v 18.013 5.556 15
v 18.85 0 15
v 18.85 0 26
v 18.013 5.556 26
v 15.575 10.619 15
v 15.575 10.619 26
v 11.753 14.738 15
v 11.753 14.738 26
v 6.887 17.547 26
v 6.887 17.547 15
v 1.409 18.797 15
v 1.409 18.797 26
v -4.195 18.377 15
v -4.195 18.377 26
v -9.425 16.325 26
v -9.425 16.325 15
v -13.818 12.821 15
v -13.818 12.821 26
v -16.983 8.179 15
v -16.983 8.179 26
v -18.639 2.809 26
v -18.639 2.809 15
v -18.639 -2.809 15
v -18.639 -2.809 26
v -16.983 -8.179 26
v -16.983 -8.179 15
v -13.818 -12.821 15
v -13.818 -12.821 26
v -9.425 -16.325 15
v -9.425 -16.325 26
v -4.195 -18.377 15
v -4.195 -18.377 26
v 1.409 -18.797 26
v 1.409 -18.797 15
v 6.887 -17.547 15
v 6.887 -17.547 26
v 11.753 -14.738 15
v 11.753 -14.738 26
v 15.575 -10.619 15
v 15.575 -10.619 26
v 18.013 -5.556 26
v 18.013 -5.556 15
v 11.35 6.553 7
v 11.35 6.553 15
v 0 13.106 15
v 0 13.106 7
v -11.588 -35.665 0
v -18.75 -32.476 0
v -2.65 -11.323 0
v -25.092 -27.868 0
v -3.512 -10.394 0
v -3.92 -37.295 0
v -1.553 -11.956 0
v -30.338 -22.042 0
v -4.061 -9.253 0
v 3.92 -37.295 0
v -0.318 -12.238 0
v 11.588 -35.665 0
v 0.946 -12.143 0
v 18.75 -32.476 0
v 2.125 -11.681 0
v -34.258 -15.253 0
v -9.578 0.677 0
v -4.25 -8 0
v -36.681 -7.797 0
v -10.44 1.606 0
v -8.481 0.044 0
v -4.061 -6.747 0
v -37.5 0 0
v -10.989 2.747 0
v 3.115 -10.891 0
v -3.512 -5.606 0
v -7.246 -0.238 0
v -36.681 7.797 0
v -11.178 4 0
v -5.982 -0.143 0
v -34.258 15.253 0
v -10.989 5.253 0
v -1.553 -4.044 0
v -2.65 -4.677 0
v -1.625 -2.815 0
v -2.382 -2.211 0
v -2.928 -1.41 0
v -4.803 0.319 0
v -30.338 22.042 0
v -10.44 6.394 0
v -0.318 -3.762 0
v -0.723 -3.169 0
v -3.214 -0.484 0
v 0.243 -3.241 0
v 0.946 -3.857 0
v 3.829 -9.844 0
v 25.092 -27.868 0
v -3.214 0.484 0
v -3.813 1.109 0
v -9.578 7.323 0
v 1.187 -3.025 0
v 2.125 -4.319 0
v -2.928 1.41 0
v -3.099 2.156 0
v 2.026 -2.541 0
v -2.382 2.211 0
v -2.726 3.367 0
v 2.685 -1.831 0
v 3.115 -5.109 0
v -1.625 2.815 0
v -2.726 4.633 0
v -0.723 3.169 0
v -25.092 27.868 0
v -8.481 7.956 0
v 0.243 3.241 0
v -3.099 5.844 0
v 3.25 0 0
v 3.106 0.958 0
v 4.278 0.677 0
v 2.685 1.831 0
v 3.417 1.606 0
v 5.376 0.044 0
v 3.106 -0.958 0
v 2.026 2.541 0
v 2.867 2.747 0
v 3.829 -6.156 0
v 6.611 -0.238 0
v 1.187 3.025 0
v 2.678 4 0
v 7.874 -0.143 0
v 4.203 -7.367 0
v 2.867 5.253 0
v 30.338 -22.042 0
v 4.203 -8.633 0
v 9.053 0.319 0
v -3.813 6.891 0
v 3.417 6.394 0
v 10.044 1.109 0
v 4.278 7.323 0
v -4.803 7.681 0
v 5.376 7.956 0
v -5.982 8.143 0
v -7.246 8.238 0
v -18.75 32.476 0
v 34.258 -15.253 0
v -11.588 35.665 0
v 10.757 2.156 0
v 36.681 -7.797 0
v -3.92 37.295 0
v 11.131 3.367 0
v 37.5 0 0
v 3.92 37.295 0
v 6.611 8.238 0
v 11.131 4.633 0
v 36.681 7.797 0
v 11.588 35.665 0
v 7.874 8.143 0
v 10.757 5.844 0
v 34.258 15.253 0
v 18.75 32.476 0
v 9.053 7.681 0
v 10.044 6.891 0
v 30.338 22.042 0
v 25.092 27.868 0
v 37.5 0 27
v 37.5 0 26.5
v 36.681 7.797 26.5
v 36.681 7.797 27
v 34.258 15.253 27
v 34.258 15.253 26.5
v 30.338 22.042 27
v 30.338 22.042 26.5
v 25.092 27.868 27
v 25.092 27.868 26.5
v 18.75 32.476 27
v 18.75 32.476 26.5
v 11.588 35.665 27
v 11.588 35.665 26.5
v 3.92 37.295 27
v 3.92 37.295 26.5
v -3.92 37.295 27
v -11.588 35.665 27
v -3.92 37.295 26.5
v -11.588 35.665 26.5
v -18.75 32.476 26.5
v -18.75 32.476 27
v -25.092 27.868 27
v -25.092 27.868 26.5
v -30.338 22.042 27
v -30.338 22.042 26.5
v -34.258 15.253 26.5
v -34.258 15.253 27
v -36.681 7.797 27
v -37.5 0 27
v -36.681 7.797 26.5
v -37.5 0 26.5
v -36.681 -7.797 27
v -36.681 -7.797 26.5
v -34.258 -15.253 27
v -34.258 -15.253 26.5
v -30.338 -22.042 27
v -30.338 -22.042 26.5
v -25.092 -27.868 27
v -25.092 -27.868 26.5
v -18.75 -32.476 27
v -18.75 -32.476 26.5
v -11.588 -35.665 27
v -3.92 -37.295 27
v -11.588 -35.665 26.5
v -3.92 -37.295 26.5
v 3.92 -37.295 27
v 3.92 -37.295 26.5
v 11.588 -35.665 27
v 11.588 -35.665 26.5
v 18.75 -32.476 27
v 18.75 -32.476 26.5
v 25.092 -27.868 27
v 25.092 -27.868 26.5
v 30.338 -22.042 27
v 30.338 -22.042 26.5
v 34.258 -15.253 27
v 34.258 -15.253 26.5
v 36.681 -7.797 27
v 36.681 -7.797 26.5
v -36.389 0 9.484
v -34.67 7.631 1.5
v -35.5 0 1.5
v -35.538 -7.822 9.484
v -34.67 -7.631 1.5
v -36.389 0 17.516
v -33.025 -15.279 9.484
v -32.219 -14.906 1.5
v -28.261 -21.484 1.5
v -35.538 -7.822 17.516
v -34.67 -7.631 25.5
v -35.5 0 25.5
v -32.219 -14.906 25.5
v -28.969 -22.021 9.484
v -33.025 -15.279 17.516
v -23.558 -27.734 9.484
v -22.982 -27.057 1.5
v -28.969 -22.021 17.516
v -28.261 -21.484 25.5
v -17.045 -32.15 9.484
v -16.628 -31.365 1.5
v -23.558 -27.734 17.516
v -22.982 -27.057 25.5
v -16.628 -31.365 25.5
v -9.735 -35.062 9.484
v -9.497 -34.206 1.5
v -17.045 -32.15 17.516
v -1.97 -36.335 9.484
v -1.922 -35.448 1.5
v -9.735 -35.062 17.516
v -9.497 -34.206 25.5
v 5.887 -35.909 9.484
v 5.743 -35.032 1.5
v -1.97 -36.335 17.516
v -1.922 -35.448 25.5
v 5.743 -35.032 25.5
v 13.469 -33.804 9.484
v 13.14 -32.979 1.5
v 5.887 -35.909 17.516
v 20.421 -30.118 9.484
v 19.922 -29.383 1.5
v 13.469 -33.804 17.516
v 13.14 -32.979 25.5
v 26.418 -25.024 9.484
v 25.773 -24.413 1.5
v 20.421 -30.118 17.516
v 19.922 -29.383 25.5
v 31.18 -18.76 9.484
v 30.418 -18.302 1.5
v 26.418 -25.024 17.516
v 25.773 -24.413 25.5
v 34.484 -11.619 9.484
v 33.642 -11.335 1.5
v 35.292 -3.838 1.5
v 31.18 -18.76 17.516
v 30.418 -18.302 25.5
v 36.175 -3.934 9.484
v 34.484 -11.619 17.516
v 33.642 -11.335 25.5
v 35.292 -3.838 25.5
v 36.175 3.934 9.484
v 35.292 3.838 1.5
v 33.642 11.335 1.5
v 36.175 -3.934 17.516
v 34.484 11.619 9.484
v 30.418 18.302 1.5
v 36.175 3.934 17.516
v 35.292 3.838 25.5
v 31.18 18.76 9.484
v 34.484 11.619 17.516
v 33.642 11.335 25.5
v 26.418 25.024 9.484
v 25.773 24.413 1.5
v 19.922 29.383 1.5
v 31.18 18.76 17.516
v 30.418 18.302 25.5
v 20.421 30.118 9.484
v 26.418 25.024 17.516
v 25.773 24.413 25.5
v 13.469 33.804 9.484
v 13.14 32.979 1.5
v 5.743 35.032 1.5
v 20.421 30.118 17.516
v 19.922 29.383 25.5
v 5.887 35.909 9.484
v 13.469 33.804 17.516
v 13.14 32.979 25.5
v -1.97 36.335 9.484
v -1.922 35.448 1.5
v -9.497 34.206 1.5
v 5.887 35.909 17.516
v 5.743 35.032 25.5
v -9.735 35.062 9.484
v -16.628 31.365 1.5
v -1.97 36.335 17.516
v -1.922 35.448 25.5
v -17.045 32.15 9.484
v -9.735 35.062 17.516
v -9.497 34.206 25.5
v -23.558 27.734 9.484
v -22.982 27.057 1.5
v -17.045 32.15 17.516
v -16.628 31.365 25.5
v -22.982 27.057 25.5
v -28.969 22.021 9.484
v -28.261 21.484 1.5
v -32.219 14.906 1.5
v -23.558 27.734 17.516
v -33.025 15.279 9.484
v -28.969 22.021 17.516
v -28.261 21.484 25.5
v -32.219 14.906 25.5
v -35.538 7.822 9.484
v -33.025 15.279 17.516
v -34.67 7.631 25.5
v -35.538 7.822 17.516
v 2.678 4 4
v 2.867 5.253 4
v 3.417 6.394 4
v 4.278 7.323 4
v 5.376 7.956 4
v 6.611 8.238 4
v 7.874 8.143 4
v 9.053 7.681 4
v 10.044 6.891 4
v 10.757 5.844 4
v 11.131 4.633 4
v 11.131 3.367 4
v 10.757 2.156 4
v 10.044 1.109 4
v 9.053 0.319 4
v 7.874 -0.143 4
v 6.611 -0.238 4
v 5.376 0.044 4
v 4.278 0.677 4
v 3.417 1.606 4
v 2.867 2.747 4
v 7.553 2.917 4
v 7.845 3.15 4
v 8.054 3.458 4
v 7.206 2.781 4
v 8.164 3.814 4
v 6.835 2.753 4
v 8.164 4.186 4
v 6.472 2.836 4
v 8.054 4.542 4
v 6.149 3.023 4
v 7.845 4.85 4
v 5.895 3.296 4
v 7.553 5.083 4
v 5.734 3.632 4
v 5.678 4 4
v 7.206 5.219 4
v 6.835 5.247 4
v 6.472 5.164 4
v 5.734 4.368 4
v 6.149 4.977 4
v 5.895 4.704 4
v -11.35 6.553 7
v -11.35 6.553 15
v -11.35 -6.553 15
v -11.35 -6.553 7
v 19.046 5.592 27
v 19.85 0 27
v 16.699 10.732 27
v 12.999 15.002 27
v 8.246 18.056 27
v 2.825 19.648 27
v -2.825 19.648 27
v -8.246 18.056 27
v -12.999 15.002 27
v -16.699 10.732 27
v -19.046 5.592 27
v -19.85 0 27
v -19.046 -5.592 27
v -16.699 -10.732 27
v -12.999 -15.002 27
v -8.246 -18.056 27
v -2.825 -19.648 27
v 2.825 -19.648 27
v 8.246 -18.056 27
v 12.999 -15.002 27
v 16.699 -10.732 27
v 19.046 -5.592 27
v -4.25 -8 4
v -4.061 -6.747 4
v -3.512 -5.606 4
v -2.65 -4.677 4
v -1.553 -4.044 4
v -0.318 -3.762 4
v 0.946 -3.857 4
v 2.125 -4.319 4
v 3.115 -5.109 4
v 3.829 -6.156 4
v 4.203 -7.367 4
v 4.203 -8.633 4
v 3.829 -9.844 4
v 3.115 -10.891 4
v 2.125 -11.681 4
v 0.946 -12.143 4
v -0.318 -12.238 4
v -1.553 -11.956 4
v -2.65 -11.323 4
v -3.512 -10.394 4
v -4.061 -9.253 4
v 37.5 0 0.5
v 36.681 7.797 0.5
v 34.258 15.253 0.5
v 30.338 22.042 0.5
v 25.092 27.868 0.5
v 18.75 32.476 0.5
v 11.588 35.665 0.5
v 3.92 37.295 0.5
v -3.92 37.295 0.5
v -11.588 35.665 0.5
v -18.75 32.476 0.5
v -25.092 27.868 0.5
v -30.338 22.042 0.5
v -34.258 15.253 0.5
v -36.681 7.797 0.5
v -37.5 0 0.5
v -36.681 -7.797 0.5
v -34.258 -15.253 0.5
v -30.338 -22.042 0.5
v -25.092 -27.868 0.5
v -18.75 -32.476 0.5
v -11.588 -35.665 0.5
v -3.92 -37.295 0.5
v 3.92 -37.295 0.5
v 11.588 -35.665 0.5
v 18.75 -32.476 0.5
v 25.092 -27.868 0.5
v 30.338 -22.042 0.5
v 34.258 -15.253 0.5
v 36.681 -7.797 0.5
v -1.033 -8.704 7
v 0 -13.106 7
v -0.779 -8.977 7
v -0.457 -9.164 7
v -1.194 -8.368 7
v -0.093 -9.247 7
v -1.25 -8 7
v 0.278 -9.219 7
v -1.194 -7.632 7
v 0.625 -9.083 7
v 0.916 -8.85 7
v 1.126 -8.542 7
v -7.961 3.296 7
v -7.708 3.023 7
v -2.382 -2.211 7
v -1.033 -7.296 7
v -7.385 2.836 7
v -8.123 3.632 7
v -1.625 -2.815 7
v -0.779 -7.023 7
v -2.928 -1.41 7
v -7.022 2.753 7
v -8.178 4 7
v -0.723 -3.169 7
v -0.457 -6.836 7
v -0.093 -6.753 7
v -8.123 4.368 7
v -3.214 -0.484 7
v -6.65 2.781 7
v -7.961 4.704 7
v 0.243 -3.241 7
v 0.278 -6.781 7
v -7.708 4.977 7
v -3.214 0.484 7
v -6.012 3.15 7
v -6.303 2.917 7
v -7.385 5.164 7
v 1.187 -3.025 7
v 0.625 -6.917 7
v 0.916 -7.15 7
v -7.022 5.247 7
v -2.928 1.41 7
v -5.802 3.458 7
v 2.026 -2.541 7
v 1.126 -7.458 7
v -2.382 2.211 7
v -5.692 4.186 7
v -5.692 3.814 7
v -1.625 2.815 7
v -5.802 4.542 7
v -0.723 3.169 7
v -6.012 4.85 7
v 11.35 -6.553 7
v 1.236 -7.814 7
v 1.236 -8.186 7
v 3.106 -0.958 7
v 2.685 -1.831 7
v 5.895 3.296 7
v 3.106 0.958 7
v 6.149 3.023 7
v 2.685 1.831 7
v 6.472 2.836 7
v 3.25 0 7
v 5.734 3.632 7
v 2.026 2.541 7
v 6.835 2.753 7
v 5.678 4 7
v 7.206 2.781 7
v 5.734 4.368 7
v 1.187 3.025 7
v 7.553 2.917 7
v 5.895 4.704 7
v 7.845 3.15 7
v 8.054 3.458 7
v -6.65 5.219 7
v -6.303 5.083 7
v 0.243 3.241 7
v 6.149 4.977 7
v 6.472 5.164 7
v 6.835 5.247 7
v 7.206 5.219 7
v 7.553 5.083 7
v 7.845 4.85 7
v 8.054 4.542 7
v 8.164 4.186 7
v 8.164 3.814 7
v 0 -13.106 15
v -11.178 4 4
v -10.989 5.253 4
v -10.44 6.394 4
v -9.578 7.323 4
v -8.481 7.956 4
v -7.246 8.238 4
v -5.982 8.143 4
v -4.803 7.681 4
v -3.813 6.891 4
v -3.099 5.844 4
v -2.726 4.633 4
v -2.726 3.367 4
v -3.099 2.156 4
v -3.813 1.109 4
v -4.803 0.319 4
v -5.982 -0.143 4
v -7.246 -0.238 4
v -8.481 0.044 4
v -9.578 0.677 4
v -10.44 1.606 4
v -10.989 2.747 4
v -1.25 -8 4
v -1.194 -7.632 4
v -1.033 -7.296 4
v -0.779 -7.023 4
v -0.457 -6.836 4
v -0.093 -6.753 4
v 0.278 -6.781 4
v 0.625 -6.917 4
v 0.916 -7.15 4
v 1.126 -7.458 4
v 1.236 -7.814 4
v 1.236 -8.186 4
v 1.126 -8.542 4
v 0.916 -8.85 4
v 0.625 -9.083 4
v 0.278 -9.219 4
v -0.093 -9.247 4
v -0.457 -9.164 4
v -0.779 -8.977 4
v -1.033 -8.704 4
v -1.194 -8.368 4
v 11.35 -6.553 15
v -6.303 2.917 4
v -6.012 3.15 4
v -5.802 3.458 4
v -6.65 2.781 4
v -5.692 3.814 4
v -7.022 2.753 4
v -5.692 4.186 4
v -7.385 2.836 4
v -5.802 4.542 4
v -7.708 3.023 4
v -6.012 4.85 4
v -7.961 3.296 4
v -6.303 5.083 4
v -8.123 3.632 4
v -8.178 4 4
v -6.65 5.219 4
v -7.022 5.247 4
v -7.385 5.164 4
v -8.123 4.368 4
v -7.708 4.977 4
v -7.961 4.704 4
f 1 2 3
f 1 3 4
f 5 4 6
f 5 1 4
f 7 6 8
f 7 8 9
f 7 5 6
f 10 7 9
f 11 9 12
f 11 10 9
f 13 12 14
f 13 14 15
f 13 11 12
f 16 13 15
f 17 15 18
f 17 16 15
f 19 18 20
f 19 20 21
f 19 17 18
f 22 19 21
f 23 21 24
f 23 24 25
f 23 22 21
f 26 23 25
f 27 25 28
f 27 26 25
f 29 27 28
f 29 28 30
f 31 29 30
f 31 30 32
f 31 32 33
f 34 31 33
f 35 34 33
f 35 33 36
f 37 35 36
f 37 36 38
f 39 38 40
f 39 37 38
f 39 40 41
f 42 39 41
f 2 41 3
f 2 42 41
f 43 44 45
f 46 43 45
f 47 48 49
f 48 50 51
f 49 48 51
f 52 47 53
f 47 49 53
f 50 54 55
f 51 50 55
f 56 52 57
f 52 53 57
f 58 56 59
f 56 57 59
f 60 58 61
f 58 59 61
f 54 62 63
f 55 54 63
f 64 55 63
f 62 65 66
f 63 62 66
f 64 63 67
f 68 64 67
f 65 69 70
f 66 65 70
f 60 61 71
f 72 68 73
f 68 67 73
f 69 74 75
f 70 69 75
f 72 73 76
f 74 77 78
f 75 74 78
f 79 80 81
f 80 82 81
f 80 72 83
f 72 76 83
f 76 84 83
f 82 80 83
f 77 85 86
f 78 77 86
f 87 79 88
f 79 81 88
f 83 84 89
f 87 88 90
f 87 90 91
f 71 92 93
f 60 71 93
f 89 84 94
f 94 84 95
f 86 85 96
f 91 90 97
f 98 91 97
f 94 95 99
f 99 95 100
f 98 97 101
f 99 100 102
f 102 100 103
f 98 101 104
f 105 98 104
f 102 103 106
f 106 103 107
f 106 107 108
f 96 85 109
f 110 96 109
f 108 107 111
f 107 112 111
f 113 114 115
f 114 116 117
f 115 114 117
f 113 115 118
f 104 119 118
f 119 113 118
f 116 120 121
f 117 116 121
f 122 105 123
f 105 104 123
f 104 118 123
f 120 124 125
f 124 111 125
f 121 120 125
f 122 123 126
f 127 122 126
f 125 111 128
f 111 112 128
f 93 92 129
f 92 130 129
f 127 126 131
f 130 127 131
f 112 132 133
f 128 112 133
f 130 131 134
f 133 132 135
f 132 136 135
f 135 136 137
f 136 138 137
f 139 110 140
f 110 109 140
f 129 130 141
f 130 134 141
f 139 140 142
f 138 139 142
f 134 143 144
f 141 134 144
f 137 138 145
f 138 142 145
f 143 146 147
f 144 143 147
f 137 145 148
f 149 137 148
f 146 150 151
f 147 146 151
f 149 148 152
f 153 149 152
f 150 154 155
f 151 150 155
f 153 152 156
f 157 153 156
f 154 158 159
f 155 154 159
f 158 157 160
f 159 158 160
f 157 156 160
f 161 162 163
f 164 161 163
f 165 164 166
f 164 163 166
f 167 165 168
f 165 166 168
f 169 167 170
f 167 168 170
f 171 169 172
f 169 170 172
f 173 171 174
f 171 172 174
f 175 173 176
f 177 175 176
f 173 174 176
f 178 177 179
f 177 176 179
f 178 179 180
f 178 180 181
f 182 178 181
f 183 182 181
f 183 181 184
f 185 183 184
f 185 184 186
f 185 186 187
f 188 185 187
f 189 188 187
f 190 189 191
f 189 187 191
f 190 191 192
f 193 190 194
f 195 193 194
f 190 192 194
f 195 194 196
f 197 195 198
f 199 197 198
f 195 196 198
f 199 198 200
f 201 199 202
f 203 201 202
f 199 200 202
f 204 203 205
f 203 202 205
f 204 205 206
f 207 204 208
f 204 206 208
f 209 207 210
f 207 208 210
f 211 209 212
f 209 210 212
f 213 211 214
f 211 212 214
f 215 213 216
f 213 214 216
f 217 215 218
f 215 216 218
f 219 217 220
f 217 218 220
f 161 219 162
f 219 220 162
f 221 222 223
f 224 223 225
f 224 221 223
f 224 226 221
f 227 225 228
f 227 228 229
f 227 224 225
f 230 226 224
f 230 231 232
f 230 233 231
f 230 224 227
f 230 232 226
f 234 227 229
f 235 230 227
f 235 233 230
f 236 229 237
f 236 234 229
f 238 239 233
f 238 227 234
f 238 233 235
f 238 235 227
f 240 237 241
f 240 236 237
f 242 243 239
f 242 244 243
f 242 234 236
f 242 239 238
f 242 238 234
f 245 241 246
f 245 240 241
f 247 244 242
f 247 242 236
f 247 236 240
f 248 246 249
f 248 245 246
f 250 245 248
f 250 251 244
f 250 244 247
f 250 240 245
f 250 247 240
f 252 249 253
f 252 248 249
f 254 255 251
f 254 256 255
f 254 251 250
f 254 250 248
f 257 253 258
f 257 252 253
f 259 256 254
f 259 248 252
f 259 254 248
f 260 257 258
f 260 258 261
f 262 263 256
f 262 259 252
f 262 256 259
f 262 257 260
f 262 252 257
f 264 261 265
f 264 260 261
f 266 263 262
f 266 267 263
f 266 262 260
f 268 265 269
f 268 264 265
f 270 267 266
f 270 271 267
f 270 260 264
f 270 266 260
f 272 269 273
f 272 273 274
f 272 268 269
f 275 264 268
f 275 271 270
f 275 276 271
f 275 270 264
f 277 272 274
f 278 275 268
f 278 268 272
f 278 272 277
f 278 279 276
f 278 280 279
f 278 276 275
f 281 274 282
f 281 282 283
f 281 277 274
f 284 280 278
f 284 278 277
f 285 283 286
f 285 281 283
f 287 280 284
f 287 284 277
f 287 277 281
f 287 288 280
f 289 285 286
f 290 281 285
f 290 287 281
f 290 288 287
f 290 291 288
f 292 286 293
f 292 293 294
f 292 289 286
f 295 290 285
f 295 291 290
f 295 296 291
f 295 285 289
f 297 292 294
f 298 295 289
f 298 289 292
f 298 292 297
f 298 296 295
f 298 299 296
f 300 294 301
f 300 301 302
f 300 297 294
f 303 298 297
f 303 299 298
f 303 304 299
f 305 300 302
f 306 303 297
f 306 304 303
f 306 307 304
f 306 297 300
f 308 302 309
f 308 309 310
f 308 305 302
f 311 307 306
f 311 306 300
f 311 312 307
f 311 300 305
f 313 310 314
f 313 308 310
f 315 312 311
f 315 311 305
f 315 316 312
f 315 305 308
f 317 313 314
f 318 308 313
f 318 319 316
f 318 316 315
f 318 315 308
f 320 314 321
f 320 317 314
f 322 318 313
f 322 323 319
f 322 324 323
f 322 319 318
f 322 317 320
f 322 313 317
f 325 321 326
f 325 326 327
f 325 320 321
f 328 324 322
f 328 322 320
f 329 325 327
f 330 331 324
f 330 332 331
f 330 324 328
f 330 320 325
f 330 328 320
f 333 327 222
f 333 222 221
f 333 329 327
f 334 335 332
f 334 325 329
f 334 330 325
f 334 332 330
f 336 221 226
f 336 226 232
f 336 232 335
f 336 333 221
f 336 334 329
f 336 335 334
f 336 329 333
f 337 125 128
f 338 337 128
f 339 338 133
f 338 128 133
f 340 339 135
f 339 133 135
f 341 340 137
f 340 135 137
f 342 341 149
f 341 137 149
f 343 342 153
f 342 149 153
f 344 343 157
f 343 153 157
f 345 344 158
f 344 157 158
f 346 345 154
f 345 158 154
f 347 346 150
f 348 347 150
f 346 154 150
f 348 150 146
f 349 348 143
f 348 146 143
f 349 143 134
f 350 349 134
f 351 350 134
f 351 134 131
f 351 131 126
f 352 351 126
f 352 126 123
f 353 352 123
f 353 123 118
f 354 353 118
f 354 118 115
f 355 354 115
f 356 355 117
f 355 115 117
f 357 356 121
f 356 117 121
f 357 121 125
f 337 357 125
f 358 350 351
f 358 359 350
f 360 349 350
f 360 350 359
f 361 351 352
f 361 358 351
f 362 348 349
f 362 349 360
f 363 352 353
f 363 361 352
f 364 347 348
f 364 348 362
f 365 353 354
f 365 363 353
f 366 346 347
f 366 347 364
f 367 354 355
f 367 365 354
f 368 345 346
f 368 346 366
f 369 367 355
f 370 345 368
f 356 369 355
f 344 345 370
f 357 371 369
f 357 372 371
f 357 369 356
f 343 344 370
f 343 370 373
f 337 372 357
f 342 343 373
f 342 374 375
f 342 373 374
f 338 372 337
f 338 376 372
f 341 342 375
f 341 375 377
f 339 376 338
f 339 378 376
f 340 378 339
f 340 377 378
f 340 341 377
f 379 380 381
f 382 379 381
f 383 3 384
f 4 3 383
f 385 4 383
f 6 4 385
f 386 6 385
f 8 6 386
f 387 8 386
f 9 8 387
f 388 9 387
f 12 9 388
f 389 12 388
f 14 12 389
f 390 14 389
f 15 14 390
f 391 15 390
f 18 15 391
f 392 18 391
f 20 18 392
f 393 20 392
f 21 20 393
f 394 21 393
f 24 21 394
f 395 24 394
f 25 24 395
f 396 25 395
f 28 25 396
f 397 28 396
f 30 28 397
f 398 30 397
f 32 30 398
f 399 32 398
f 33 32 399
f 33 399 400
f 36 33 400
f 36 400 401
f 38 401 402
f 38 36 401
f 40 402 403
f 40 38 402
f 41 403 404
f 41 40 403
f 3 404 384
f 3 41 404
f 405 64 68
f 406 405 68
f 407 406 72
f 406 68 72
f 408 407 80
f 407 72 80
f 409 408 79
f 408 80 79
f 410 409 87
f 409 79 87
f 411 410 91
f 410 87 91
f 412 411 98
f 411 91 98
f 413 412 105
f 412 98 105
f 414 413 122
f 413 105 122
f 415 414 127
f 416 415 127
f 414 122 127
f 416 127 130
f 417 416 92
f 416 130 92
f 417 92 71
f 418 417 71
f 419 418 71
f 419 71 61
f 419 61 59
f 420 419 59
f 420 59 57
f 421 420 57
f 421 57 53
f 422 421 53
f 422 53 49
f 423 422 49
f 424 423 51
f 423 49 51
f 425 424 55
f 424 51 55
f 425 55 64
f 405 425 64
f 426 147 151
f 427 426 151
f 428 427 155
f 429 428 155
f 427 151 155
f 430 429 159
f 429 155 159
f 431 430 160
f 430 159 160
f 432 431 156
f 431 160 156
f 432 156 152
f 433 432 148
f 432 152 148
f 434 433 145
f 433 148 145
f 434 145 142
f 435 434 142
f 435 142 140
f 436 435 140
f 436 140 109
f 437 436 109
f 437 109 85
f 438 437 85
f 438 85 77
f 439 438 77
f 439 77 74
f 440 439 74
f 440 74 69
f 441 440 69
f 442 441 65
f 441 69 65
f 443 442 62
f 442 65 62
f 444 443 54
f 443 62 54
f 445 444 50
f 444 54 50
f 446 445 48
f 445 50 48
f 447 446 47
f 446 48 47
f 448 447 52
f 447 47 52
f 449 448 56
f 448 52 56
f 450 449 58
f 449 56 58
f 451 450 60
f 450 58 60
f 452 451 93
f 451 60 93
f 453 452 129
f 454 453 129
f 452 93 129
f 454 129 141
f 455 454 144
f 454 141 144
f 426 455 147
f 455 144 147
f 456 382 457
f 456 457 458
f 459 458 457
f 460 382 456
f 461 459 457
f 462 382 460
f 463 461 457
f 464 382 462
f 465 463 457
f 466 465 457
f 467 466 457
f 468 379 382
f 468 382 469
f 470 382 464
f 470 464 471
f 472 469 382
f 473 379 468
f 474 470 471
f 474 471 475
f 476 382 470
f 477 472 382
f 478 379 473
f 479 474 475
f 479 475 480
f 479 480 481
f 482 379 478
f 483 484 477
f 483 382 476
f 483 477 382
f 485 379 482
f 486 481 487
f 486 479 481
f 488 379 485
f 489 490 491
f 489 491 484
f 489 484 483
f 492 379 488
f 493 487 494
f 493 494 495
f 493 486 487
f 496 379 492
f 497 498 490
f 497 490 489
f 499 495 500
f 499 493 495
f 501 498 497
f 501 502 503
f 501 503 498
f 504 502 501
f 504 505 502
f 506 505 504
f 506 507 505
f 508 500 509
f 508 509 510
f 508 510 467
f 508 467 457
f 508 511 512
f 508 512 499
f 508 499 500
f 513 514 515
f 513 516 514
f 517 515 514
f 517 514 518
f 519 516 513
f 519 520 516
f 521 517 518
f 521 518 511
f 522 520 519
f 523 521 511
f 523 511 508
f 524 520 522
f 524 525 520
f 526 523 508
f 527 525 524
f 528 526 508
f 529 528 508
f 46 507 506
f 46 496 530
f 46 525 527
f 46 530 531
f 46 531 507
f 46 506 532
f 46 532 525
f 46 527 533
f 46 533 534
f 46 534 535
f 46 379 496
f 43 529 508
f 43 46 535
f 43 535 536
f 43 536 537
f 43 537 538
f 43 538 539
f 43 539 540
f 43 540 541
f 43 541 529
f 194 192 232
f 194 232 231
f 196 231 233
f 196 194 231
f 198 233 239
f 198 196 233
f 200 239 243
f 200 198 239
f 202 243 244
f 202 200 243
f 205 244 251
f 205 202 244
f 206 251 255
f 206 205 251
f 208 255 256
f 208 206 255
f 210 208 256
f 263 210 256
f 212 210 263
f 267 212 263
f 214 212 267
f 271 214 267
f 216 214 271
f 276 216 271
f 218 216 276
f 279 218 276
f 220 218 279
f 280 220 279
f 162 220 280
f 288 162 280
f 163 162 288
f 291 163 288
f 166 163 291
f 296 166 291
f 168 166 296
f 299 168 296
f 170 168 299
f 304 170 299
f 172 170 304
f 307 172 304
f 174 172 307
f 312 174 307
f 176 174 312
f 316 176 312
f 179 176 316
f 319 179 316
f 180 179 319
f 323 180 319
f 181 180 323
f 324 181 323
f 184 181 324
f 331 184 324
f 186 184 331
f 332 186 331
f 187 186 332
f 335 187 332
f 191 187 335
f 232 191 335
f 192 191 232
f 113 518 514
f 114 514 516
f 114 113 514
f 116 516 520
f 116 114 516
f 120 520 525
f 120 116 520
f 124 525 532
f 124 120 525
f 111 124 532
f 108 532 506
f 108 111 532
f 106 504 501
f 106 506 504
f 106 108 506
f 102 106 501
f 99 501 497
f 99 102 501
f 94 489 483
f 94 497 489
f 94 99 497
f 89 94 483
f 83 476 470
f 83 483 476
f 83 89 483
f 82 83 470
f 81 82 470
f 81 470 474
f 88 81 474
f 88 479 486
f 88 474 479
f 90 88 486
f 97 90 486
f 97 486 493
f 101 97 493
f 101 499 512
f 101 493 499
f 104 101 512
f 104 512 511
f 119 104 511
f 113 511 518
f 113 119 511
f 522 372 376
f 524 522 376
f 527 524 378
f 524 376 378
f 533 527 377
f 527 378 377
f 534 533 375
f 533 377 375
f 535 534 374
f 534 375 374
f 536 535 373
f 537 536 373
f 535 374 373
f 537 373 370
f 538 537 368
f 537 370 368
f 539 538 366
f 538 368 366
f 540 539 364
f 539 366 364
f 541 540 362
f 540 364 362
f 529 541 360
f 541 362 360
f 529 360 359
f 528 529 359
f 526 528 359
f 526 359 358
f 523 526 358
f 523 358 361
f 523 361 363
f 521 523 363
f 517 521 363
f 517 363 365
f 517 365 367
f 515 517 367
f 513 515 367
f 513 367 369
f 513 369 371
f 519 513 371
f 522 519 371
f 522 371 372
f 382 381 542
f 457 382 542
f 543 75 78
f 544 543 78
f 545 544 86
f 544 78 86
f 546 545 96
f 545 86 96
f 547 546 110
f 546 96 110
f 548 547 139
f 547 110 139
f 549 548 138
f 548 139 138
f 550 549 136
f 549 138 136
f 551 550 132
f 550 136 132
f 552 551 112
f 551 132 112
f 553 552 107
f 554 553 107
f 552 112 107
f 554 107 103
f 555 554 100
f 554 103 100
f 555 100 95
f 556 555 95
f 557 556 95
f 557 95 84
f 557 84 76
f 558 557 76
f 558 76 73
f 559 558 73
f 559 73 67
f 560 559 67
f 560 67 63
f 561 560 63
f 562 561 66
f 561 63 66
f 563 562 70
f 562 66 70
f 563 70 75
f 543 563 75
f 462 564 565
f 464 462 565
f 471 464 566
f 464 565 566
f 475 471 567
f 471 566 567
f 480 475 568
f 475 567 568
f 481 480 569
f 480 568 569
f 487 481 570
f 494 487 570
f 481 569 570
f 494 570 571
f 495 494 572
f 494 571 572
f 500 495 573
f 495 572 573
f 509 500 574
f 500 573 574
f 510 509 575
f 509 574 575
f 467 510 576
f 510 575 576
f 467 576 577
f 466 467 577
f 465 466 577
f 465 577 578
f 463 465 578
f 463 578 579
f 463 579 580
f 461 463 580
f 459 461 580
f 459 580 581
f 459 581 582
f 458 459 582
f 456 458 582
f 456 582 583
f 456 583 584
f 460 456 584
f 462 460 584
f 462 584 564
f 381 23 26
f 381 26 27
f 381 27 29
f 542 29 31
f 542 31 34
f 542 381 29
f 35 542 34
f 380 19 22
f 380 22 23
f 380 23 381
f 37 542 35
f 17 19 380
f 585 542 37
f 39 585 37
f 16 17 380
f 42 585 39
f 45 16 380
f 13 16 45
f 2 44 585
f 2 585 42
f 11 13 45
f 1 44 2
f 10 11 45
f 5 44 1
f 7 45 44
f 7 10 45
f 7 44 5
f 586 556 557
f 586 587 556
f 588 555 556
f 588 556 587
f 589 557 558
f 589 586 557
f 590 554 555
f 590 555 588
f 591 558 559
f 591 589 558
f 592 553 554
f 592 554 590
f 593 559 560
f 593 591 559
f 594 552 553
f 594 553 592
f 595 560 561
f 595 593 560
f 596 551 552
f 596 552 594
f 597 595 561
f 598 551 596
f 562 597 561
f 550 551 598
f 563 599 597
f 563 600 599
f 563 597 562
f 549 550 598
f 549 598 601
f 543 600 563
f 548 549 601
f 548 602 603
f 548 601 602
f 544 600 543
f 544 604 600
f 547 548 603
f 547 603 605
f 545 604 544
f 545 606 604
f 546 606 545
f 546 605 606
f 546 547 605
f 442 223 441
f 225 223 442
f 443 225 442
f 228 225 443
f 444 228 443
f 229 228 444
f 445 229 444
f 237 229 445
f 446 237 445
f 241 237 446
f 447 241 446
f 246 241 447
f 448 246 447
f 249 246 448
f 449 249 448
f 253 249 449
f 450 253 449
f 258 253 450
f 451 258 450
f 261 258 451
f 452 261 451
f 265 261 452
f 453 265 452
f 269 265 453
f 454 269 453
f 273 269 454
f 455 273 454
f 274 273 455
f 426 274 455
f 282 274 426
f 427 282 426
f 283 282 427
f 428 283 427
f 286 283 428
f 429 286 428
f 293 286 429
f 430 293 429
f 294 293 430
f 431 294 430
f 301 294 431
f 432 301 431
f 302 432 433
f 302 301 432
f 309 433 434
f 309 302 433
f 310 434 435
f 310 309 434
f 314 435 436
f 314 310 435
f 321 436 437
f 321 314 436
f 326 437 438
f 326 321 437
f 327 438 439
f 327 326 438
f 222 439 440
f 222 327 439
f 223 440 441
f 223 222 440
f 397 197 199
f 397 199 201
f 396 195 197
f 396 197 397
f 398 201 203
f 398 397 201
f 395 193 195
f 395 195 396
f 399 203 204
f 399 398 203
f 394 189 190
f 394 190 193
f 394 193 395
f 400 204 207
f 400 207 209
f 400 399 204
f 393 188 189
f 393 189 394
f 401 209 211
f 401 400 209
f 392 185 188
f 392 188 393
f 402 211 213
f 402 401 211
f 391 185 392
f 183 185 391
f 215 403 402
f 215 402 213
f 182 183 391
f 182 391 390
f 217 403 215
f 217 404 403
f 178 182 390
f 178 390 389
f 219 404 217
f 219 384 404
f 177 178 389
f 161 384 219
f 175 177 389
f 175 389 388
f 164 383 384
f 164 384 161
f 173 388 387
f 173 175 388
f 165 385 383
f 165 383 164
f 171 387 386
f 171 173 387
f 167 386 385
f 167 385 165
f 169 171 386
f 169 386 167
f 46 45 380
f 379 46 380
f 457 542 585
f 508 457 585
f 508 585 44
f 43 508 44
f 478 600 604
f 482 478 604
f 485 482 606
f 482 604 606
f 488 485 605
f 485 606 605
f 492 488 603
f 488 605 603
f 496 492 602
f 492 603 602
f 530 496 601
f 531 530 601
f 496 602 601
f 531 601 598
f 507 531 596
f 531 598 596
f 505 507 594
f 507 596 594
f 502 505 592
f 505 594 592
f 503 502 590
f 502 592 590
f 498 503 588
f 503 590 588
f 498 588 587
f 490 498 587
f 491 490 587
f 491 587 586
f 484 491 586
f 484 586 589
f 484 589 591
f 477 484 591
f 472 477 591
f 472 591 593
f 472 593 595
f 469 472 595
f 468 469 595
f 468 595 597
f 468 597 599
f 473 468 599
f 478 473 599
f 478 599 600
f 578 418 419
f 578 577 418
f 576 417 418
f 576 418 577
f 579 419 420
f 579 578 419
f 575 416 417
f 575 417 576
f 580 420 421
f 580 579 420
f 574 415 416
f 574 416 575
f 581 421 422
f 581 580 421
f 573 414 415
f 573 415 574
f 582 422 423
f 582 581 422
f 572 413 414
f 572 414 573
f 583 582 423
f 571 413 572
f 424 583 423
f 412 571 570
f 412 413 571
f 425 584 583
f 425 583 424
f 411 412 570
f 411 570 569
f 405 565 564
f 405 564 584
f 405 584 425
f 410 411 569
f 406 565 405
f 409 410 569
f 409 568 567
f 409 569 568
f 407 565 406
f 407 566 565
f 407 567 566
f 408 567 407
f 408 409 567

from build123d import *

# Parameters (mm, degrees)
ESQUISSE1_R              = 37.5
ESQUISSE1_R_2            = 3.25
BOSS_EXTRU_1_DEPTH       = 15
ESQUISSE2_R              = 37.5
ESQUISSE2_R_2            = 18.85
BOSS_EXTRU_2_DEPTH       = 12
ENL_V_MAT_EXTRU_9_DEPTH  = 8
CHANFREIN1_SIZE          = 1
ESQUISSE11_R             = 1.25
ENL_V_MAT_EXTRU_10_DEPTH = 60.510503275
ESQUISSE12_R             = 4.25
ENL_V_MAT_EXTRU_11_DEPTH = 4


with BuildPart() as part:
    # Esquisse1 → Boss.-Extru.1 (new body)
    with BuildSketch(Plane.XY):
        Circle(ESQUISSE1_R)
        Circle(ESQUISSE1_R_2, mode=Mode.SUBTRACT)
    extrude(amount=BOSS_EXTRU_1_DEPTH)

    # Esquisse2 → Boss.-Extru.2 (add)
    with BuildSketch(Plane.XY.offset(15)):
        Circle(ESQUISSE2_R)
        Circle(ESQUISSE2_R_2, mode=Mode.SUBTRACT)
    extrude(amount=BOSS_EXTRU_2_DEPTH)

    # Esquisse9 → Enlèv. mat.-Extru.9 (cut)
    with BuildSketch(Plane.XY.offset(15)):
        Polygon((11.35, -6.552925555), (11.35, 6.552925555), (0, 13.105851111), (-11.35, 6.552925555), (-11.35, -6.552925555), (0, -13.105851111), align=None)
    extrude(amount=-ENL_V_MAT_EXTRU_9_DEPTH, mode=Mode.SUBTRACT)

    # Chanfrein1
    chanfrein1_edges = [part.edges().sort_by_distance(p)[0] for p in [
        (-18.85, 0, 27),
    ]]
    chamfer(chanfrein1_edges, length=CHANFREIN1_SIZE)

    # Esquisse10 → Enlèvement de matière-Révolution1 (revolve, cut)
    with BuildSketch(Plane(origin=(0, 0, 0), x_dir=(0, 0, -1), z_dir=(1, 0, 0)), mode=Mode.PRIVATE) as enl_vement_de_mati_re_r_volution1_sk:
        with BuildLine():
            Line((-26.5, 37.5), (-0.5, 37.5))
            Line((-0.5, 37.5), (-1.5, 35.5))
            ThreePointArc((-1.5, 35.5), (-13.5, 36.5), (-25.5, 35.5))
            Line((-25.5, 35.5), (-26.5, 37.5))
        make_face()
    revolve(enl_vement_de_mati_re_r_volution1_sk.sketch.rotate(Axis((0, 0, 0), (0, 0, 1)), 90), axis=Axis((0, 0, 0), (0, 0, 1)), mode=Mode.SUBTRACT)

    # Esquisse11 → Enlèv. mat.-Extru.10 (cut, through all)
    with BuildSketch(Plane(origin=(0, 0, 0), x_dir=(-1, 0, 0), z_dir=(0, 0, -1))):
        with Locations((-6.92820323, 4)):
            Circle(ESQUISSE11_R)
        with Locations((6.92820323, 4)):
            Circle(ESQUISSE11_R)
        with Locations((0, -8)):
            Circle(ESQUISSE11_R)
    extrude(amount=-ENL_V_MAT_EXTRU_10_DEPTH, mode=Mode.SUBTRACT)

    # Esquisse12 → Enlèv. mat.-Extru.11 (cut)
    with BuildSketch(Plane(origin=(0, 0, 0), x_dir=(-1, 0, 0), z_dir=(0, 0, -1))):
        with Locations((-6.92820323, 4)):
            Circle(ESQUISSE12_R)
        with Locations((6.92820323, 4)):
            Circle(ESQUISSE12_R)
        with Locations((0, -8)):
            Circle(ESQUISSE12_R)
    extrude(amount=-ENL_V_MAT_EXTRU_11_DEPTH, mode=Mode.SUBTRACT)


solid = part.part
